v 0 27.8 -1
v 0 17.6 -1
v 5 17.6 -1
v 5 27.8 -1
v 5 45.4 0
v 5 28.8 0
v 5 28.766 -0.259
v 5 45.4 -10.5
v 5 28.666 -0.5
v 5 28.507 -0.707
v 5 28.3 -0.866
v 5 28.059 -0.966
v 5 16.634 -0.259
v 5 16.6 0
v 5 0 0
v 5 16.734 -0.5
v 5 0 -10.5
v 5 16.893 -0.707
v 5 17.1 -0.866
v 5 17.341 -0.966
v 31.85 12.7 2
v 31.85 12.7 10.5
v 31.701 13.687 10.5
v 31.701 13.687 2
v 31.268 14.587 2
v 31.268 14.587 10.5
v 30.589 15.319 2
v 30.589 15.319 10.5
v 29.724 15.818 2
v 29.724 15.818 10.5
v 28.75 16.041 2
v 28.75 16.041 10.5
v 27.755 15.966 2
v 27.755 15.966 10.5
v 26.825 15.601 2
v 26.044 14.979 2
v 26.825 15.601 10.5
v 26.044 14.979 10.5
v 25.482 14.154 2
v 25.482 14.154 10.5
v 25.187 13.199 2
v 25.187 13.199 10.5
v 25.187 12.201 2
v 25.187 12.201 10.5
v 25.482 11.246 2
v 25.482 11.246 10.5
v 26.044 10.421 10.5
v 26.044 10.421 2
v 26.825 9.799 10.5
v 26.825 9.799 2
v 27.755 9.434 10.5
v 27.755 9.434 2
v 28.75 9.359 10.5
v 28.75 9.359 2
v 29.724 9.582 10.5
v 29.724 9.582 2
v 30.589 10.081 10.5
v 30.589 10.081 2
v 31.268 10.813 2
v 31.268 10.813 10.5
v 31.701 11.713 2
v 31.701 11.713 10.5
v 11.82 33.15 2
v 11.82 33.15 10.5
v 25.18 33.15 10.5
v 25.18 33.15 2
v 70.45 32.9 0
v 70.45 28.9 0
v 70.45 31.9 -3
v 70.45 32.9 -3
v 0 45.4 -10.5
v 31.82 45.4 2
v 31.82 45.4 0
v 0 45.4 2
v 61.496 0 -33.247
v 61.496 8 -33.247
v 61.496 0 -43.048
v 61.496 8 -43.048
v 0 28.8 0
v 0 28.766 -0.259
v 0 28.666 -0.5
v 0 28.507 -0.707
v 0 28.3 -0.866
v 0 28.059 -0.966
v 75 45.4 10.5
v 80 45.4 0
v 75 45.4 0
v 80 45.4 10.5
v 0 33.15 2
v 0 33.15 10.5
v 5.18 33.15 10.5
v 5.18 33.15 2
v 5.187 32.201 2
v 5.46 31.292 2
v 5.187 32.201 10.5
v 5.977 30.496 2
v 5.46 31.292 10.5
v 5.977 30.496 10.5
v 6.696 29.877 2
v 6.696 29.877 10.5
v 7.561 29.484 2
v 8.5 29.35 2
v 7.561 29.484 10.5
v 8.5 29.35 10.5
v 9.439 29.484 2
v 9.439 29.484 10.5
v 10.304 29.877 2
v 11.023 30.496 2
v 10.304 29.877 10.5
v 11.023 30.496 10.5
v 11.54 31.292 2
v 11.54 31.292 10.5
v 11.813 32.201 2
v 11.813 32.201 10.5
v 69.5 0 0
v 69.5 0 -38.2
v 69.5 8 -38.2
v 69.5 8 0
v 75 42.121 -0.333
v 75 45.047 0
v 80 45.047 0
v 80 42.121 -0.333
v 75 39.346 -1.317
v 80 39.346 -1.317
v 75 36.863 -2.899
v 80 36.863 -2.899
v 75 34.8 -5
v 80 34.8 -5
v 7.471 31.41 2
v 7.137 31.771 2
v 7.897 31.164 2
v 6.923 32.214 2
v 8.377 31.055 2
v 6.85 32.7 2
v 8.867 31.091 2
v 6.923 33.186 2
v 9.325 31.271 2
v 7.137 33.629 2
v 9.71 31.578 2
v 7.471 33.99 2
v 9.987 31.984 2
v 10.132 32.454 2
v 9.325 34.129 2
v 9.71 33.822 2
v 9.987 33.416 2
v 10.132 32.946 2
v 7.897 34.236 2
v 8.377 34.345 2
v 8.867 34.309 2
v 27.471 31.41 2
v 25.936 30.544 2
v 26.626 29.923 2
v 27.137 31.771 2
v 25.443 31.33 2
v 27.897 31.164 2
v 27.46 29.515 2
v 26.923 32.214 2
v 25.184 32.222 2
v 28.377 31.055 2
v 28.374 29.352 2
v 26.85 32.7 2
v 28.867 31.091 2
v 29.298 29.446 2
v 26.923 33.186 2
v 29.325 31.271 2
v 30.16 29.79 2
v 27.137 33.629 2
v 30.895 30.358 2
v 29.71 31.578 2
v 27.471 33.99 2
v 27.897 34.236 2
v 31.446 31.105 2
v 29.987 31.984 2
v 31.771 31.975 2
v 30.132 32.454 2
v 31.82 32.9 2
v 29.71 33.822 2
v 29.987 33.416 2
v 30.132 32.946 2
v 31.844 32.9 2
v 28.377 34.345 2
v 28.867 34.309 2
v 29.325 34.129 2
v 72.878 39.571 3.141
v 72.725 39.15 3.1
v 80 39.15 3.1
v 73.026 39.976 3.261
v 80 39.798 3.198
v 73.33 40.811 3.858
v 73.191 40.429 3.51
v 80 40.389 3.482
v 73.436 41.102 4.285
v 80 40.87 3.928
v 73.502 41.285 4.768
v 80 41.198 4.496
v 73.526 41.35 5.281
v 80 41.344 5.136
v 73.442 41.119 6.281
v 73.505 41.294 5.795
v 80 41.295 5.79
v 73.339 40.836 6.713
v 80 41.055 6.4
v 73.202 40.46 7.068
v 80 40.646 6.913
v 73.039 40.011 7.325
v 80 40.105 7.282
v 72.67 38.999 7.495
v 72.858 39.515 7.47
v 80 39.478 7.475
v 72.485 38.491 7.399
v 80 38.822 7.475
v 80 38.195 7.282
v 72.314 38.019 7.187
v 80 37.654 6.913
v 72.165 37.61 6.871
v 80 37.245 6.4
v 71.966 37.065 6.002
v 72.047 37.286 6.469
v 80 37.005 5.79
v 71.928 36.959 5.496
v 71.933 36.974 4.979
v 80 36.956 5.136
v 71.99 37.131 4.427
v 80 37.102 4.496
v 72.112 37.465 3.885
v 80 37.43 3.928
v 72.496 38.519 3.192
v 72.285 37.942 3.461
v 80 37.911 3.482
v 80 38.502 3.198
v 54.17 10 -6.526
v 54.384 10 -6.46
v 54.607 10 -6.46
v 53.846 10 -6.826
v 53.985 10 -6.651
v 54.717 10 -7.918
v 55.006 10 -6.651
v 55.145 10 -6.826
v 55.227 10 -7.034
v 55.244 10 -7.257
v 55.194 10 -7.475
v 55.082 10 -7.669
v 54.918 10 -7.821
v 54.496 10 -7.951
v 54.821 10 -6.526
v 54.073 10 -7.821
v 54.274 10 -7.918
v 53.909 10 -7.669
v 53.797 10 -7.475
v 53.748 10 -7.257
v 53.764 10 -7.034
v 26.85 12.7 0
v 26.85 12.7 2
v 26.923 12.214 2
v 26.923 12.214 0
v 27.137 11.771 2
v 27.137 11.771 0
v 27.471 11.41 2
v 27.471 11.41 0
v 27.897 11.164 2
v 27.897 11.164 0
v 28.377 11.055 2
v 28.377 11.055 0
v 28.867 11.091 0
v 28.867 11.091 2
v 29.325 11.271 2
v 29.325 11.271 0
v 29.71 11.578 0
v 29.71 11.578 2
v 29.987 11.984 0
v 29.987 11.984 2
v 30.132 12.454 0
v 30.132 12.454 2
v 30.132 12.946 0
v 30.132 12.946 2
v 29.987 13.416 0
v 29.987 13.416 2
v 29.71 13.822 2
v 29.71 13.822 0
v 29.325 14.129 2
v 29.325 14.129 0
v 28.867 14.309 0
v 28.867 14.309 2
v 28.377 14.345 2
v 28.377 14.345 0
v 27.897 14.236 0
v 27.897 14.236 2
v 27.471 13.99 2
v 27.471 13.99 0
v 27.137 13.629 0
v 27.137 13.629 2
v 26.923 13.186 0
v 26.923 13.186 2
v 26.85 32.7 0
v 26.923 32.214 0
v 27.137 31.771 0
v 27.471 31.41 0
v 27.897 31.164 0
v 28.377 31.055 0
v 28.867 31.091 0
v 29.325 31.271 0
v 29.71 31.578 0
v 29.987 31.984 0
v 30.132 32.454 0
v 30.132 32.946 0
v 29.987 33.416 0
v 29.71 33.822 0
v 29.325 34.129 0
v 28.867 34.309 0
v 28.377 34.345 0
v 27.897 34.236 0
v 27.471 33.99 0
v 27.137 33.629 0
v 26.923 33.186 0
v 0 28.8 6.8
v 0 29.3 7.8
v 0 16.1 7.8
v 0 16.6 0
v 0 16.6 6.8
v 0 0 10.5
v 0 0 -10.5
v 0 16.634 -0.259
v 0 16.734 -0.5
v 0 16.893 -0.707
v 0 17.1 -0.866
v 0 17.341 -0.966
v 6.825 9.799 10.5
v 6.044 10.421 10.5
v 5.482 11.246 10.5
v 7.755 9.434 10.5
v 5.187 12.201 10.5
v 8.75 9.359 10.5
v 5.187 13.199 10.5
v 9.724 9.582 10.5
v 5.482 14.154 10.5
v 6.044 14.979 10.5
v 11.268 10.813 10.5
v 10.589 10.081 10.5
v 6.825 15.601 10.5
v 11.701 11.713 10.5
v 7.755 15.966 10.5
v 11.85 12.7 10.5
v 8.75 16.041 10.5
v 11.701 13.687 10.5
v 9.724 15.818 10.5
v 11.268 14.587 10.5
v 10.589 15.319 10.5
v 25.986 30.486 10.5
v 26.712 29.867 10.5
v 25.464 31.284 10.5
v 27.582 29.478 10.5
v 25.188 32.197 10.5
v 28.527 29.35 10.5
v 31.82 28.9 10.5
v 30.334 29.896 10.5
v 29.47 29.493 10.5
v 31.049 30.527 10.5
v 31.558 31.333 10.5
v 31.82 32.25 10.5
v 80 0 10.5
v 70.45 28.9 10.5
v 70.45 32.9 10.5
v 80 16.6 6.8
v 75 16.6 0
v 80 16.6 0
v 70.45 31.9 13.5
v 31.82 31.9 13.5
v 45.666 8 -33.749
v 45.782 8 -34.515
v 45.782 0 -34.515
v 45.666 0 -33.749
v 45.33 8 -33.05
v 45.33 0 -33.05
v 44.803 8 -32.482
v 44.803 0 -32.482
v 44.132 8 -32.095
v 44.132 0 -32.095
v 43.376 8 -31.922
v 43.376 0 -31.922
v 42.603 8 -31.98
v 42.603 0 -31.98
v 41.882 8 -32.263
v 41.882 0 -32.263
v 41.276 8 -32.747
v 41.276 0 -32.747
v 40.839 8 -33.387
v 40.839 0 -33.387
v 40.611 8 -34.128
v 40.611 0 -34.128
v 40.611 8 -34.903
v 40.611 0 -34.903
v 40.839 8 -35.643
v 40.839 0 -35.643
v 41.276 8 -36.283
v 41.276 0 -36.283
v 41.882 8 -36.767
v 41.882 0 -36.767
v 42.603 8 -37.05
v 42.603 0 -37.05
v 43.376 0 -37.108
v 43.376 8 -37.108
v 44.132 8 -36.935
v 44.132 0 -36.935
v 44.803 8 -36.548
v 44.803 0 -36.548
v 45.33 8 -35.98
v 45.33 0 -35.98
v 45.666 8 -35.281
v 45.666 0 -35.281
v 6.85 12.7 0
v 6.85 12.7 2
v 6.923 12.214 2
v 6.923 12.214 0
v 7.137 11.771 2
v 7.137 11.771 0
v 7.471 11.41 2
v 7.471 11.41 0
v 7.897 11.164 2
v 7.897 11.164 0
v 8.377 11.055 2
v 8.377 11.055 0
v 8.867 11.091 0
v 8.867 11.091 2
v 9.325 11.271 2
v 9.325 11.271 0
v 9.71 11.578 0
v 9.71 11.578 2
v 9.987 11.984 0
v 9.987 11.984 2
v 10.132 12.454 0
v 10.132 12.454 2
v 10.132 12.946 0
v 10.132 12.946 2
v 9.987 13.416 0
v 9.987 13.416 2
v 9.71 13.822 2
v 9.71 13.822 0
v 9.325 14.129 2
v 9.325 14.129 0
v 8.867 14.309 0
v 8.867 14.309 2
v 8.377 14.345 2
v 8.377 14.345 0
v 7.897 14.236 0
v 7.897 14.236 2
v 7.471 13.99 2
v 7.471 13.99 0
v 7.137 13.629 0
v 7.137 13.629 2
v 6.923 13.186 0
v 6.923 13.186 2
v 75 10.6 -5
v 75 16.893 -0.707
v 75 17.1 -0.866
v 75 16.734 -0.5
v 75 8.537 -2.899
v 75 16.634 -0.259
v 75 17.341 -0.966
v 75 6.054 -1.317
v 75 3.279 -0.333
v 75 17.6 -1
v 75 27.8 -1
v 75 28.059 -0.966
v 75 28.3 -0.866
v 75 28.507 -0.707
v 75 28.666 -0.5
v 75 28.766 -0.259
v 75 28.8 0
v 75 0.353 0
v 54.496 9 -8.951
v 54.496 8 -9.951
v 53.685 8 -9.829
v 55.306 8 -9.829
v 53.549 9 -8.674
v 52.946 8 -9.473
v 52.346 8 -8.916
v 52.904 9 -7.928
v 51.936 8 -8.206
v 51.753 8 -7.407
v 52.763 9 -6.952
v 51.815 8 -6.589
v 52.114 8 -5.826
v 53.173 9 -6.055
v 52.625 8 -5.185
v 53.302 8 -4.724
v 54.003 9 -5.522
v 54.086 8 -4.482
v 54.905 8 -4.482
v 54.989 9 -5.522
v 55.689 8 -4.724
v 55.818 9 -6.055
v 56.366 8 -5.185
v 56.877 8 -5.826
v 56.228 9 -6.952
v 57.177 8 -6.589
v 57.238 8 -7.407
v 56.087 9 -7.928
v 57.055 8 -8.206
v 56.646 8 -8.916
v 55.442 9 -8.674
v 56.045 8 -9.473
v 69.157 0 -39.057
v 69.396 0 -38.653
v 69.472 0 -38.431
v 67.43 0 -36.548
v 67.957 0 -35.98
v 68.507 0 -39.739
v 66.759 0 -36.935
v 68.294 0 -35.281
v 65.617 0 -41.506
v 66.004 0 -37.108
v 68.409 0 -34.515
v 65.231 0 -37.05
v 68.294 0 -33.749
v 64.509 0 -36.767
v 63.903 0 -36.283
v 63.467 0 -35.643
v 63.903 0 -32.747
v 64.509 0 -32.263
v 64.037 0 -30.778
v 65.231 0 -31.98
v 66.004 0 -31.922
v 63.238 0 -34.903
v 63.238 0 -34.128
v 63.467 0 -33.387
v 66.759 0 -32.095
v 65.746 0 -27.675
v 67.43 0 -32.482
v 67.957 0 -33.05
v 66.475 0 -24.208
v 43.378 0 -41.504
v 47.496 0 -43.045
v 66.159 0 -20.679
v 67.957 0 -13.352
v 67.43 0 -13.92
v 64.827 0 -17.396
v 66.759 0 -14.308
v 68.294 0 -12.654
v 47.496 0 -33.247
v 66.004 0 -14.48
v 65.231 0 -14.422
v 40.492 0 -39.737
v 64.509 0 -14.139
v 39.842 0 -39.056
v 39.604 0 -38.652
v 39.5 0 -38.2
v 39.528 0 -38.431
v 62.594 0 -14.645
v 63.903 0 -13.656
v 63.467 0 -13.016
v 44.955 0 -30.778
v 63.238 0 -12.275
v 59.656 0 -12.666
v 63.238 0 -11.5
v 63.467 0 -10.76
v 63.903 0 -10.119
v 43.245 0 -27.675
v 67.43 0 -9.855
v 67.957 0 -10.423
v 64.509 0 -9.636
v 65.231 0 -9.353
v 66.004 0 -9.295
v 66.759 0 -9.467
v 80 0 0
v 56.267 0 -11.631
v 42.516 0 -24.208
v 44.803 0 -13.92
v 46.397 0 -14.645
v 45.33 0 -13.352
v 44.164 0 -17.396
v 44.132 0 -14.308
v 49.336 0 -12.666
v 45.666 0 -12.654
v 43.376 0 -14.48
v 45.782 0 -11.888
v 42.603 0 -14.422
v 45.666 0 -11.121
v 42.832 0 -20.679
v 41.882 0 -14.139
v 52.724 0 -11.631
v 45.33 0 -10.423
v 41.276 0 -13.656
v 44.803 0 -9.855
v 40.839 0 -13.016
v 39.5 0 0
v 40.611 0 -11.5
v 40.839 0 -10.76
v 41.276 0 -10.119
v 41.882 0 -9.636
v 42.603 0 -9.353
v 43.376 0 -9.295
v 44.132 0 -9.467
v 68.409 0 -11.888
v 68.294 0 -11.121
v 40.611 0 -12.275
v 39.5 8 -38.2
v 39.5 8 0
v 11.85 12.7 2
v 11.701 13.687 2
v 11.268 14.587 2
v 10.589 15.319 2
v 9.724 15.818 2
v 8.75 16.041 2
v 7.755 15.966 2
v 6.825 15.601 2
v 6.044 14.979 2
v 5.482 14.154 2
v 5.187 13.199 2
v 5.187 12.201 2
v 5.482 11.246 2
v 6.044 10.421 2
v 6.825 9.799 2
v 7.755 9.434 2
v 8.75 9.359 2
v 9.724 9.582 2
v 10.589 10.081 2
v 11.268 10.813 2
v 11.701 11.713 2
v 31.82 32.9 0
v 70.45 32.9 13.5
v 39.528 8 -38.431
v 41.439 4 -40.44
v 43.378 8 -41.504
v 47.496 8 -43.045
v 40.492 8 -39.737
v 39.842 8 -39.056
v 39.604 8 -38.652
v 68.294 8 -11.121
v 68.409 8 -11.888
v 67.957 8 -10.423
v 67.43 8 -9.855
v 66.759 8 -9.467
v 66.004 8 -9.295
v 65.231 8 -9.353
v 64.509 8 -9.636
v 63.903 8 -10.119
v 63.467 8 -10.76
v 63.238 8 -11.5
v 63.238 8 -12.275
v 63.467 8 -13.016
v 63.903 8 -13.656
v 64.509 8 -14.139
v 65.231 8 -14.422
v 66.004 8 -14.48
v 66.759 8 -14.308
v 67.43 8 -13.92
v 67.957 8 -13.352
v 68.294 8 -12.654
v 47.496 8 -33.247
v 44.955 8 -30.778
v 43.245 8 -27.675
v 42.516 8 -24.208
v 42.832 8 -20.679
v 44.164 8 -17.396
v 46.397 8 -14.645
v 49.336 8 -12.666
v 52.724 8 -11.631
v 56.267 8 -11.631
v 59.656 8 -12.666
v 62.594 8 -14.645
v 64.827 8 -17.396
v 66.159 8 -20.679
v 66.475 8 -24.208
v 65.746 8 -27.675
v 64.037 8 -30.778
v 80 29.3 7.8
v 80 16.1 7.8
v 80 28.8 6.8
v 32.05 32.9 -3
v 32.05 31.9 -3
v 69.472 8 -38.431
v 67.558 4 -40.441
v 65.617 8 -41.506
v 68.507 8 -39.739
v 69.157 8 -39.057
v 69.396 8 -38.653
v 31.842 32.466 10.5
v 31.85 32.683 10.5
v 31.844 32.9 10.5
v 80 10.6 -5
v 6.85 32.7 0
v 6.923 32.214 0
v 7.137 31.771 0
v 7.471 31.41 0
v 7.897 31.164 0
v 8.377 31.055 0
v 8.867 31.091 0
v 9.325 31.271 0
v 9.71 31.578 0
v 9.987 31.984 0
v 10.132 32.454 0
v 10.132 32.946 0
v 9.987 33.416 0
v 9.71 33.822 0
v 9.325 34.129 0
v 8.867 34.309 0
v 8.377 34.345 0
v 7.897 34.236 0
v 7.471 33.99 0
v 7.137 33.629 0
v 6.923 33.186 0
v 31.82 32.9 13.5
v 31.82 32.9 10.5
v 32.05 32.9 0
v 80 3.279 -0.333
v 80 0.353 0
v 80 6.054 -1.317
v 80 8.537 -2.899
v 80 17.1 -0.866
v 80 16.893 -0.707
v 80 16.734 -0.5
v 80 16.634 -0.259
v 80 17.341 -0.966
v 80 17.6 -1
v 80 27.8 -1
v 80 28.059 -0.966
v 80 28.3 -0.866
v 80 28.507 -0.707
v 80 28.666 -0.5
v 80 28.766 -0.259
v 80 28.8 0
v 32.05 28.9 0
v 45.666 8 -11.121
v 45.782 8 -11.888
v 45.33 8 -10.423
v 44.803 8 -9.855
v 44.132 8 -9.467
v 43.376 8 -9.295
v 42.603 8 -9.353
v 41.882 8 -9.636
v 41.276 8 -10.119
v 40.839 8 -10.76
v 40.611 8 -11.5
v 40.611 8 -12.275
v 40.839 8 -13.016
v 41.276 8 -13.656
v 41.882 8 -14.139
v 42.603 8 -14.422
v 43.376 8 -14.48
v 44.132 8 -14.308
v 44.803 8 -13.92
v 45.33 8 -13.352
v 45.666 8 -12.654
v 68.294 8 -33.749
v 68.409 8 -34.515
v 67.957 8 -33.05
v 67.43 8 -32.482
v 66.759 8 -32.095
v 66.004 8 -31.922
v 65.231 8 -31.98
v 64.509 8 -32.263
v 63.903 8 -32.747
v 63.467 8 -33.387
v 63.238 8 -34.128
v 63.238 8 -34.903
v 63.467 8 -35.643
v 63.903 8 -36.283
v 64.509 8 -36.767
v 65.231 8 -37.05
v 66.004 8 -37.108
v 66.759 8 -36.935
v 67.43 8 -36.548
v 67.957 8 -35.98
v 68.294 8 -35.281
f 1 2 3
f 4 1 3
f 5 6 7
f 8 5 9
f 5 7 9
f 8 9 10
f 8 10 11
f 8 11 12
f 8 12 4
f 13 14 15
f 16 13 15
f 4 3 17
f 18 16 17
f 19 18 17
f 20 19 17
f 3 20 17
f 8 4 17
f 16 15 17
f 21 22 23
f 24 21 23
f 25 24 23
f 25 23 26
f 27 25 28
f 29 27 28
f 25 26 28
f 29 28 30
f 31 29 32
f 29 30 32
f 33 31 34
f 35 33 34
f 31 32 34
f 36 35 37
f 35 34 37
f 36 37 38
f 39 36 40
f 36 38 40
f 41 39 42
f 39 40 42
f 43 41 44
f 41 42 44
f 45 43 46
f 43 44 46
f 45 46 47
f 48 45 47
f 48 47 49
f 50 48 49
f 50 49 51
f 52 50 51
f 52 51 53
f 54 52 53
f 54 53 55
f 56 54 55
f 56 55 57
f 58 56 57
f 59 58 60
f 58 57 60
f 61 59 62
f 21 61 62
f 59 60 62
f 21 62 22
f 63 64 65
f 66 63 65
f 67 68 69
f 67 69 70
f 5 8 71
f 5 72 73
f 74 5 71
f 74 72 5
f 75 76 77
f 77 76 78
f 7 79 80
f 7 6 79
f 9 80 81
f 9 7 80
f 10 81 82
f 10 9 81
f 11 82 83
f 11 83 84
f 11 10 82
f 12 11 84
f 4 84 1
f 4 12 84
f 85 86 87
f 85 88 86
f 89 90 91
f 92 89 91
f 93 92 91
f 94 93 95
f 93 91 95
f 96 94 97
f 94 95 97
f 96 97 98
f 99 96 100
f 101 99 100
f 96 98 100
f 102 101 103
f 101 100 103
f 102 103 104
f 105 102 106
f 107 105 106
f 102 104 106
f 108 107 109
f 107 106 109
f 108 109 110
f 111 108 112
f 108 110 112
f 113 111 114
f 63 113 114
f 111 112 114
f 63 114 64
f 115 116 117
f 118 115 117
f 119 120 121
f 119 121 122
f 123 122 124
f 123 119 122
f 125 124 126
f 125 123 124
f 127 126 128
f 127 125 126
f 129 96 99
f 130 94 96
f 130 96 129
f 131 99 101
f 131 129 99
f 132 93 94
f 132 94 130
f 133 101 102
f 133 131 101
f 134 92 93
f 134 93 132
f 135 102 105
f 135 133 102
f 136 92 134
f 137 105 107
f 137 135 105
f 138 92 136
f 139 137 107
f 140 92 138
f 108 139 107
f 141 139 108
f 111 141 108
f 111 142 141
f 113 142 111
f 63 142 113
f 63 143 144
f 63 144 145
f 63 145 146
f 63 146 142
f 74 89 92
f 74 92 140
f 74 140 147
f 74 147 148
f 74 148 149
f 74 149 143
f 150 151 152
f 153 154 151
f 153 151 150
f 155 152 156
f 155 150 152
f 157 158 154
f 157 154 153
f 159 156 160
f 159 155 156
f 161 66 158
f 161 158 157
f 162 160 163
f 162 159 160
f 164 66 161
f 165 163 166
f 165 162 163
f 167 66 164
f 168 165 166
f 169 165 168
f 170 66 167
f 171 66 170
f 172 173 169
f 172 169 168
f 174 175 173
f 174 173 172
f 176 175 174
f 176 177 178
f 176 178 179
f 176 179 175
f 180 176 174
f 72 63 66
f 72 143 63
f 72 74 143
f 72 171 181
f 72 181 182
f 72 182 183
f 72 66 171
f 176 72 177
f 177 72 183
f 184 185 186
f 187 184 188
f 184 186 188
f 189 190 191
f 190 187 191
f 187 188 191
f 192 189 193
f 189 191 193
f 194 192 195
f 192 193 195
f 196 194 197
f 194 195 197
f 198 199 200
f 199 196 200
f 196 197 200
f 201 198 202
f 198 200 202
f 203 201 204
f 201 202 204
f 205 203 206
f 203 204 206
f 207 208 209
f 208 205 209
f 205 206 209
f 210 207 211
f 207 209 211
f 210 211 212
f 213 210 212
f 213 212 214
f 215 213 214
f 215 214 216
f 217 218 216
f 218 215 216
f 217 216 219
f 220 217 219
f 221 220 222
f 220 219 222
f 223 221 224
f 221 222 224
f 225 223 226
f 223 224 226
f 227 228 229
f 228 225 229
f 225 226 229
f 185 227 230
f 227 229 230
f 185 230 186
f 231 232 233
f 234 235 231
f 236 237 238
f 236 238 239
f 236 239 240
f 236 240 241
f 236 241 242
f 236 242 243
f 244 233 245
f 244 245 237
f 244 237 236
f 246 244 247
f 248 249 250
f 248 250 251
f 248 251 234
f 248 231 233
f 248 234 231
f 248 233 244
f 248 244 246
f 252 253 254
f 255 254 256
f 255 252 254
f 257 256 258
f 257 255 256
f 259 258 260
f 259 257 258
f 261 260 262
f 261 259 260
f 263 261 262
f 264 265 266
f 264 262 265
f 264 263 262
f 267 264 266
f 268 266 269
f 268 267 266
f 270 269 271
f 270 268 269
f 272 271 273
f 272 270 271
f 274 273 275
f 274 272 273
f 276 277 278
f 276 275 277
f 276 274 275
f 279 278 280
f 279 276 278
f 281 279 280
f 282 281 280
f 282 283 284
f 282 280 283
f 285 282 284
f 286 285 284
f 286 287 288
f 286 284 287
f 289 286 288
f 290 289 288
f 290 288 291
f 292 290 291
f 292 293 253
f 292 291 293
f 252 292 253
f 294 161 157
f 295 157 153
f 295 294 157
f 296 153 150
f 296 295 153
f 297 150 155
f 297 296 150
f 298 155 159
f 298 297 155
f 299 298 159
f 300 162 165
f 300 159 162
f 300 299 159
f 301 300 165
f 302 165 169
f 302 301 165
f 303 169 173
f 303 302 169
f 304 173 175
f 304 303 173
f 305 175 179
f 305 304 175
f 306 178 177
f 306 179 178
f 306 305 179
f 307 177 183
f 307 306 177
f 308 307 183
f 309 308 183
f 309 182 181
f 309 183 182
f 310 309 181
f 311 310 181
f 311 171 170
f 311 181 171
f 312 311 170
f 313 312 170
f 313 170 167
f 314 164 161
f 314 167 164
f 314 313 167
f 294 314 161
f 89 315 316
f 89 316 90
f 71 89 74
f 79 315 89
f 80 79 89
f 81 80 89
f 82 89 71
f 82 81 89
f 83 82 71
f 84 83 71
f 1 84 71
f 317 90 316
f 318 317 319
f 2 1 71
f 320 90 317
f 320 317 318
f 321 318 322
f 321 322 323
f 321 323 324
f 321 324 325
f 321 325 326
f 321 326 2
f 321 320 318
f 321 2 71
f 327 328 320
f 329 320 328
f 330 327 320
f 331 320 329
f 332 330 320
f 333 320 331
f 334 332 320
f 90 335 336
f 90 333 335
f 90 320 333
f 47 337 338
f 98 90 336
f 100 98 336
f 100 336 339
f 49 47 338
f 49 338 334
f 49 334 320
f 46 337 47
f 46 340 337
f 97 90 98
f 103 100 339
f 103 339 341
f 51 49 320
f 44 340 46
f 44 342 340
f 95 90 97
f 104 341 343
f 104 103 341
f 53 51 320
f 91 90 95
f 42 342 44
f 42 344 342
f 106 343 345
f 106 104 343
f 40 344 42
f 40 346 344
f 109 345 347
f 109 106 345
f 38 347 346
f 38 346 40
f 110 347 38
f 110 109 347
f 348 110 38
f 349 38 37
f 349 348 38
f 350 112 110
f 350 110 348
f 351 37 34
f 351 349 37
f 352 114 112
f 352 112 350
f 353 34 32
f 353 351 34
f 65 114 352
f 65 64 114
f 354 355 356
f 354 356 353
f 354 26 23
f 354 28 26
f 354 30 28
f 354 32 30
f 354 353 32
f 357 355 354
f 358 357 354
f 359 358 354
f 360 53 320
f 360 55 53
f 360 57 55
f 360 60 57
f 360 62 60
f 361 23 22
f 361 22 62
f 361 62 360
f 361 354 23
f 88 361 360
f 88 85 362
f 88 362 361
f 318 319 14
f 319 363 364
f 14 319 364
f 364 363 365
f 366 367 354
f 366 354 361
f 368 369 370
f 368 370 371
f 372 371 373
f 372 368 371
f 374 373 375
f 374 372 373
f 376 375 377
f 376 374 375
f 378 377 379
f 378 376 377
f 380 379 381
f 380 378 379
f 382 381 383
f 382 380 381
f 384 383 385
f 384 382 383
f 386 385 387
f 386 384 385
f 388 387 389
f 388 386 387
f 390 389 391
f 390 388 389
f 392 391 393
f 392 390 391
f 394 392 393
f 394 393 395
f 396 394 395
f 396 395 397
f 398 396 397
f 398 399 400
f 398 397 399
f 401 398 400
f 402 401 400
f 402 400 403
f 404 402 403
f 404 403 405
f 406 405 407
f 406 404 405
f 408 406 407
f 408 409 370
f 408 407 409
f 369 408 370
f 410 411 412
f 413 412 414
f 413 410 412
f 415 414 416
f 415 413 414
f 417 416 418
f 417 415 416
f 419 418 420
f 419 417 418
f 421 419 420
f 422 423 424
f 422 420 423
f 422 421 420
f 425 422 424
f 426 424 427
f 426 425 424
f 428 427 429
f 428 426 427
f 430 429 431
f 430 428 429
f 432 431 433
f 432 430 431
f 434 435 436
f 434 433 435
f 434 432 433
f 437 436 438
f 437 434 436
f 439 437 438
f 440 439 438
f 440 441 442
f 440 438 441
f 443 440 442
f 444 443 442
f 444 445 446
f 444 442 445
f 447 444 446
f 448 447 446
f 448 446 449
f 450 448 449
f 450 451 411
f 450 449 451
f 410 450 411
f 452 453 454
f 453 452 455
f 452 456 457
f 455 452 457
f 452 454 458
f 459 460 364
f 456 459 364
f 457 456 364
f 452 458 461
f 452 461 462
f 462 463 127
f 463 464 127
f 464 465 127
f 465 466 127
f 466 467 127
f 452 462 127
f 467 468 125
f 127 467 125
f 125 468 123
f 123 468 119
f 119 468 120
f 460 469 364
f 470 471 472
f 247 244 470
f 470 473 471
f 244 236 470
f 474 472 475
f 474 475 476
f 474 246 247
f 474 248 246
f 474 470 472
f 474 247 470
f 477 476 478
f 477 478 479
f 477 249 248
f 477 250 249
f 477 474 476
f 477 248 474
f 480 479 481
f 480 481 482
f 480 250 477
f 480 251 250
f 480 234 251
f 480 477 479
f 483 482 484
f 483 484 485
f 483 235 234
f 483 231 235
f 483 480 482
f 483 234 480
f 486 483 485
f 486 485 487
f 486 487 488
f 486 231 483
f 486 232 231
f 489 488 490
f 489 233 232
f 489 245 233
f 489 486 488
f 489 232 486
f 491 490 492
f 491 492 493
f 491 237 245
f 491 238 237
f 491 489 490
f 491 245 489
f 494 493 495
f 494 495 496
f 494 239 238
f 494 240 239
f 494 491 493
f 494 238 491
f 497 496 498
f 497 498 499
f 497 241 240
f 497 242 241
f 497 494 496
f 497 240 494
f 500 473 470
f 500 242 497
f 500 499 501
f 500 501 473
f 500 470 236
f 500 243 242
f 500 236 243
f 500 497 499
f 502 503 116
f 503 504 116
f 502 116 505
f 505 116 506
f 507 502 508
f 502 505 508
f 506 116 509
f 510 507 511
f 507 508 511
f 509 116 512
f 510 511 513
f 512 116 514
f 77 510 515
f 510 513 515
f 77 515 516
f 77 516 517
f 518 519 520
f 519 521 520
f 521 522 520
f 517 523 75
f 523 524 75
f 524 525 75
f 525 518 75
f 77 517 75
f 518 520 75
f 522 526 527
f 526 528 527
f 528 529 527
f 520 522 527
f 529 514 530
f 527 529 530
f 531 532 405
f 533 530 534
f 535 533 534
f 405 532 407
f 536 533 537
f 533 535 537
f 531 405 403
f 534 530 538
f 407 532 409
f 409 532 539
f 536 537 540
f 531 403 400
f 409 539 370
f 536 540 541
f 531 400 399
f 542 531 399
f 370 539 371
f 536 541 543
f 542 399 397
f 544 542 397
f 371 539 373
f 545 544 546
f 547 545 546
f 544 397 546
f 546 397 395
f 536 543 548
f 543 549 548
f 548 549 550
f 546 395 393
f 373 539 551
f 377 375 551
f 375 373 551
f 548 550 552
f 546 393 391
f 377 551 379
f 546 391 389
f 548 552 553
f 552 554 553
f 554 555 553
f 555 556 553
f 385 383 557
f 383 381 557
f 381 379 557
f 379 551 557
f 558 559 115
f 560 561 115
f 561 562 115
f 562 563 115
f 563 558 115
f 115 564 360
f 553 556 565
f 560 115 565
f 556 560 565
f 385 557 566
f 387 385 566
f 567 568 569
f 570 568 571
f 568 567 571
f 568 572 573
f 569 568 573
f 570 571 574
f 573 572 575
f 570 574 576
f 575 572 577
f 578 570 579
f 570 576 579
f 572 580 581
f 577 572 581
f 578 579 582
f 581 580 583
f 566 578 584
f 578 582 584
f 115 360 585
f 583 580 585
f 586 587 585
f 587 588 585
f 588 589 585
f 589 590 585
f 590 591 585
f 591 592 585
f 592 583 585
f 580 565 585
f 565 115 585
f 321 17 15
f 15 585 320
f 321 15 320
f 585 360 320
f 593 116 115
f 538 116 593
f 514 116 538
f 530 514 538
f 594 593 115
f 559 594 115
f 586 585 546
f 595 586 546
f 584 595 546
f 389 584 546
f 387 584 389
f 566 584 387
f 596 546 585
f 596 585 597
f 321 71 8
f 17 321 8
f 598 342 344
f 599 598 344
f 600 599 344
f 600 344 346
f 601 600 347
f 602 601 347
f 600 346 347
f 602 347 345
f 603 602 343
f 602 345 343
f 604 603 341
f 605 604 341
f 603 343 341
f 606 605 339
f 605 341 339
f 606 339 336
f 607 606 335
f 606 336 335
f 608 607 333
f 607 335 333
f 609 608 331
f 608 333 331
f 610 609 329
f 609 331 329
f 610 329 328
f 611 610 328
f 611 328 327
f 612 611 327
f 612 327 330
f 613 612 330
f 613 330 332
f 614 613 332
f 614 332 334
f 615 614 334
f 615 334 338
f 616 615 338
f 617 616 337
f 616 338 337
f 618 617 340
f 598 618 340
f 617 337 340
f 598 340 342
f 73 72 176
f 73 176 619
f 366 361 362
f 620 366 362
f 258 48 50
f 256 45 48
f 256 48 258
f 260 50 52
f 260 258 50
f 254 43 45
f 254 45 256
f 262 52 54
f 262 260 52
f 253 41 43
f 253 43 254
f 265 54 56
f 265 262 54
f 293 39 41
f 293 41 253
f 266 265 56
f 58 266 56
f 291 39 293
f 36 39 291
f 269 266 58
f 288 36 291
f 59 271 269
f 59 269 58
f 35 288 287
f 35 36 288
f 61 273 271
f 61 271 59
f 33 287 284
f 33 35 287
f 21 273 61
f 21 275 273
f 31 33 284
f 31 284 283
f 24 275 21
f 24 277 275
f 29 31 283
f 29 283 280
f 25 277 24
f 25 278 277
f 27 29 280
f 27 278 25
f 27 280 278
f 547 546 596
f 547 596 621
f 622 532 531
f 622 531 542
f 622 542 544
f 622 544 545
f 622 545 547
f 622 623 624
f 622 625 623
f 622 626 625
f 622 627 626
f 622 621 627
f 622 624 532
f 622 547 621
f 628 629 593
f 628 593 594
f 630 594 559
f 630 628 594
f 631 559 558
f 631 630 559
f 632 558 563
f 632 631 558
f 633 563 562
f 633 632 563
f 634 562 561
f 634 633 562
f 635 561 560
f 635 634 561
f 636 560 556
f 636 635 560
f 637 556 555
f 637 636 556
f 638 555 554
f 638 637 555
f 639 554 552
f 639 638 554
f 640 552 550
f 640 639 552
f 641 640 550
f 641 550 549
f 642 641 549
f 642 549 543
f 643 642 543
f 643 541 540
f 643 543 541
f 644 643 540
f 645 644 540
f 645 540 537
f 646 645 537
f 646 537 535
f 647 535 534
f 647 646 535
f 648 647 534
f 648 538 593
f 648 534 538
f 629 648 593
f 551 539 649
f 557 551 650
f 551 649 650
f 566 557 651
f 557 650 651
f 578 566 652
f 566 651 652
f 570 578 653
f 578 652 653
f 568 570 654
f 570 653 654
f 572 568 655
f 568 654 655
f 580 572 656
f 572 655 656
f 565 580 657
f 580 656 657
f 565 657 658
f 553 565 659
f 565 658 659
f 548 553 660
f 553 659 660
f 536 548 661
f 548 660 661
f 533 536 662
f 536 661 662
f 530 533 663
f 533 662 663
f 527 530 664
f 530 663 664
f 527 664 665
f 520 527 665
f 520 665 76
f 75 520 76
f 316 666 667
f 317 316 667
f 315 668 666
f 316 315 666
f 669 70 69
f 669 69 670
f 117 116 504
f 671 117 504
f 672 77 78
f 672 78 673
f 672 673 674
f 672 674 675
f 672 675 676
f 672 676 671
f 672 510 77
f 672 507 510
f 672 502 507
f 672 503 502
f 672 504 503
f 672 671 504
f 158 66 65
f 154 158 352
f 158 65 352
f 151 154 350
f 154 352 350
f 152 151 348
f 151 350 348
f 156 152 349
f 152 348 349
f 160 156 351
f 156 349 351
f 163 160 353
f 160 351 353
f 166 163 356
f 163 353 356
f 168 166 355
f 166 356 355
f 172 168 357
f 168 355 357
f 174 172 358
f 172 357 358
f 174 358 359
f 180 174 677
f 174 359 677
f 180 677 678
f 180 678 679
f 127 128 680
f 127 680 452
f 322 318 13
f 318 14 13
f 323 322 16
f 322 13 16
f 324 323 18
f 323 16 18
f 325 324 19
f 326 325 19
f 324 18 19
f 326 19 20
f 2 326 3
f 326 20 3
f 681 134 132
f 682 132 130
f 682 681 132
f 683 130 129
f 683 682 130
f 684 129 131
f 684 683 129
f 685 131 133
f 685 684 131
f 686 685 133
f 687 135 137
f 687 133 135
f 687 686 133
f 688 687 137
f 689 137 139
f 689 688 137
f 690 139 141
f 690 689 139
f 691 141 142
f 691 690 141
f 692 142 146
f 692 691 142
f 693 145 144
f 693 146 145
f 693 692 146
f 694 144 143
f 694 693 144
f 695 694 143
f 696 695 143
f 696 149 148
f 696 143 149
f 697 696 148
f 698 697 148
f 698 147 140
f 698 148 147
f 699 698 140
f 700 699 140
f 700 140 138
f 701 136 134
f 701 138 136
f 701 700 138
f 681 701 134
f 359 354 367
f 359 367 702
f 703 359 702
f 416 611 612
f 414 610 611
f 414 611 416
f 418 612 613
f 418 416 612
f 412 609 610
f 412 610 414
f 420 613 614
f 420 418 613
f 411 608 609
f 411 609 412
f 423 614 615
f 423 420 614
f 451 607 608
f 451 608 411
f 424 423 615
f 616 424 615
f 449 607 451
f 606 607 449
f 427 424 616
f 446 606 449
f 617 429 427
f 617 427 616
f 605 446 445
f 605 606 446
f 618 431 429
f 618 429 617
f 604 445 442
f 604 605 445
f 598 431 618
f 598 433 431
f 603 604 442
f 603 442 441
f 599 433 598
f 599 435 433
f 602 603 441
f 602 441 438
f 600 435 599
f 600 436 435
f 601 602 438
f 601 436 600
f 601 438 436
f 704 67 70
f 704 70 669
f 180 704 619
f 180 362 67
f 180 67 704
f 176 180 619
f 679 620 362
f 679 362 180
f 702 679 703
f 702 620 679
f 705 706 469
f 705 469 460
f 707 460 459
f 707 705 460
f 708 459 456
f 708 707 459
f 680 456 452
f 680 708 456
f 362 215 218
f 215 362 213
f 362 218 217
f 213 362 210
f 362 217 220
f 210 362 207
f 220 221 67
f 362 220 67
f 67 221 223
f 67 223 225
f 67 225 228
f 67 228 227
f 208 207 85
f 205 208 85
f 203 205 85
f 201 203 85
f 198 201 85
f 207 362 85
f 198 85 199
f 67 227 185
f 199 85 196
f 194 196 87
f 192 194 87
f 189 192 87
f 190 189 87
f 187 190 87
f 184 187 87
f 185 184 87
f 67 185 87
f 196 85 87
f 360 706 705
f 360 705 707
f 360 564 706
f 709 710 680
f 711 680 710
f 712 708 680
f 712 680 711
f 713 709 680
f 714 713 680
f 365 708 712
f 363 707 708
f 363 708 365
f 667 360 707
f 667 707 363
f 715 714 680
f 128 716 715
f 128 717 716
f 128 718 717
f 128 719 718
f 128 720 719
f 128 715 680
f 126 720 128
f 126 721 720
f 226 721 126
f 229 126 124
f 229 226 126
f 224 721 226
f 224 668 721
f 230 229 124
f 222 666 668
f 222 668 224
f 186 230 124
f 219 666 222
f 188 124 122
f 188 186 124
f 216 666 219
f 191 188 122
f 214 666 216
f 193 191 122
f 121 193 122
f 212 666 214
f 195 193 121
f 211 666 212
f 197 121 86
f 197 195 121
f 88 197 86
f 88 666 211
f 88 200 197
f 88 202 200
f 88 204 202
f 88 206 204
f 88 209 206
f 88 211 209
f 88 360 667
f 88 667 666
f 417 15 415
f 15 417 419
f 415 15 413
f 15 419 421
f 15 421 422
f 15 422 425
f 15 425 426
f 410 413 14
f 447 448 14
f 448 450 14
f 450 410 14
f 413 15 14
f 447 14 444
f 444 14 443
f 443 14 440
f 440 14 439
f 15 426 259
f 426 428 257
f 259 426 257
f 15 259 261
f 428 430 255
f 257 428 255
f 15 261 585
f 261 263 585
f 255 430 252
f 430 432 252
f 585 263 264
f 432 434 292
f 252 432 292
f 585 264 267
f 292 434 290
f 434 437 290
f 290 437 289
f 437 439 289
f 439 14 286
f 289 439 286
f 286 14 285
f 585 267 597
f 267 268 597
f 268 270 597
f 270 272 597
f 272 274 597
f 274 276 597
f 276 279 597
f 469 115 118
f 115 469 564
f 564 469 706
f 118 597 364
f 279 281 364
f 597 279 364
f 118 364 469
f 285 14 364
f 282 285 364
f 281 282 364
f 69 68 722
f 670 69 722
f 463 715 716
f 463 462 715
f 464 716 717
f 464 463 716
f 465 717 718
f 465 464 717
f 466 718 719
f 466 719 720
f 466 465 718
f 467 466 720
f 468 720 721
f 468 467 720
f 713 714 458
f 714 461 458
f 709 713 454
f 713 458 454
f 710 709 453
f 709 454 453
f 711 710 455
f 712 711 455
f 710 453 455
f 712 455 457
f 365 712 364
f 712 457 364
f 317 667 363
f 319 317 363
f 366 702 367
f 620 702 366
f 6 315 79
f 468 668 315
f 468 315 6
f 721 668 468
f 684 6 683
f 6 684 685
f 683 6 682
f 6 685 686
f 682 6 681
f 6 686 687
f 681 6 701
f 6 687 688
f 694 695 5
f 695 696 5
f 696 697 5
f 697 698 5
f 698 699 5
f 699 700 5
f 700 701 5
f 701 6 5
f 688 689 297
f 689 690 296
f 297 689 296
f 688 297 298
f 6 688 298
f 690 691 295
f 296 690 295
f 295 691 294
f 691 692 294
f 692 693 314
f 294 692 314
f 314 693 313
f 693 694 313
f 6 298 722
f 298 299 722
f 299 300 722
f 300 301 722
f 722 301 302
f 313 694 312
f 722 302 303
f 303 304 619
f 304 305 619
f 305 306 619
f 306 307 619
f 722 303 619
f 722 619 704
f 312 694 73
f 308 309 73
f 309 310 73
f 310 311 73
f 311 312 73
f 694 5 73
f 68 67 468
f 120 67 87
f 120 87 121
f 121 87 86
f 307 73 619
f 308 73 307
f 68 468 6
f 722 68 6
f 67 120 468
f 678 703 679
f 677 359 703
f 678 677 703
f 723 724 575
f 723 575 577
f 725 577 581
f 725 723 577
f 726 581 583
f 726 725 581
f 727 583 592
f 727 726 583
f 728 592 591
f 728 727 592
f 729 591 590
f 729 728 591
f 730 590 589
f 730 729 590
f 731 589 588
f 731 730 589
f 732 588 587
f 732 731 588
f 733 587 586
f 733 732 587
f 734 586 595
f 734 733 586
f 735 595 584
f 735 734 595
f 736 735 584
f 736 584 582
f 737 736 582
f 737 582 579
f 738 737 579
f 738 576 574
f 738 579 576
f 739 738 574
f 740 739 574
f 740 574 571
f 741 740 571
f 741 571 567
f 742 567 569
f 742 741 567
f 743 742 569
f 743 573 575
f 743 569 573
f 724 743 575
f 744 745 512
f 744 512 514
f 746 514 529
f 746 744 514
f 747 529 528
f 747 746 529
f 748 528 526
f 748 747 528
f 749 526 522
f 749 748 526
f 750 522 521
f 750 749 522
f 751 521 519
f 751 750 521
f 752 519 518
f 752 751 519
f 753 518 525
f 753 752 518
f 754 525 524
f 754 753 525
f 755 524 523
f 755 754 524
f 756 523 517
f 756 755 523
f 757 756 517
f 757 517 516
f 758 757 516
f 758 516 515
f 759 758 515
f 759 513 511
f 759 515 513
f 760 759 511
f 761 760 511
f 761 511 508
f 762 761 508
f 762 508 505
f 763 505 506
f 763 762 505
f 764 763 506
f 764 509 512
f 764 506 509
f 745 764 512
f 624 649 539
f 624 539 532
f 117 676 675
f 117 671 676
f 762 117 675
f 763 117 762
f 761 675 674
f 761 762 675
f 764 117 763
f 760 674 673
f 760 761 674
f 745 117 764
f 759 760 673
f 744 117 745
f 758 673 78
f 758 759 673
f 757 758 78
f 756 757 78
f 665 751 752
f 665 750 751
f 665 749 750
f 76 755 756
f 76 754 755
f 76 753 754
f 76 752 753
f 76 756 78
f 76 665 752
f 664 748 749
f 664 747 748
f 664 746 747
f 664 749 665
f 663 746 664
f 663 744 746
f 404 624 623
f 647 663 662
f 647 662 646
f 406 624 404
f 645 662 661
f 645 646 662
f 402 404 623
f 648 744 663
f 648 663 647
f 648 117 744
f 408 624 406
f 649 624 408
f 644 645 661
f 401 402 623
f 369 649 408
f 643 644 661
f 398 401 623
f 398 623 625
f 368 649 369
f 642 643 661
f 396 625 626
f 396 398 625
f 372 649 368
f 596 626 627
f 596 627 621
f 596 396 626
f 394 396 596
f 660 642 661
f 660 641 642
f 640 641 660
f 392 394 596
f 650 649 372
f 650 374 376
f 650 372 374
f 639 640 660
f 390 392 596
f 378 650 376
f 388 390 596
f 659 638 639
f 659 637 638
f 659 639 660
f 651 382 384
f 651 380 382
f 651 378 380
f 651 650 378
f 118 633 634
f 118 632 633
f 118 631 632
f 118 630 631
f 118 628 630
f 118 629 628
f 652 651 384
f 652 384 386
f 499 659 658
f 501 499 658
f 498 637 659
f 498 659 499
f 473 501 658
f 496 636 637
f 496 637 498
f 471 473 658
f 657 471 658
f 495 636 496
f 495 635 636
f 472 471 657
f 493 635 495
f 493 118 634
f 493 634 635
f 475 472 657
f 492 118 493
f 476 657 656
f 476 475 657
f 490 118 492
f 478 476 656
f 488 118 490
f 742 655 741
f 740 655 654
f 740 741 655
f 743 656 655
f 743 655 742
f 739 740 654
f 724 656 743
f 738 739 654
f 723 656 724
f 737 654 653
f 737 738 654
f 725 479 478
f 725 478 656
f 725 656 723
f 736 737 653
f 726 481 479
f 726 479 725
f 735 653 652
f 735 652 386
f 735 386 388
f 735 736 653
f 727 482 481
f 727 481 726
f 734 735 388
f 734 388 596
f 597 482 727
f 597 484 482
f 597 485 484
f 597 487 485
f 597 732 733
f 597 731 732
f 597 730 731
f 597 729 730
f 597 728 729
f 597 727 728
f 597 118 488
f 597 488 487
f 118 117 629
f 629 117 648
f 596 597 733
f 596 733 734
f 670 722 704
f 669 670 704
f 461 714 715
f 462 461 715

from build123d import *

# Parameters (mm, degrees)
SKETCH1_W               = 80
SKETCH1_H               = 45.4
SKETCH1_R               = 1.65
BOSS_EXTRUDE1_DEPTH     = 10.5
SKETCH2_W               = 5
SKETCH2_H               = 45.4
BOSS_EXTRUDE2_DEPTH     = 10.5
CUT_EXTRUDE1_DEPTH      = 7.8
CUT_EXTRUDE1_DEPTH_BACK = 93.58190968
SKETCH3_W               = 80
SKETCH3_H               = 12.2
SKETCH4_W               = 30
SKETCH4_H               = 8
BOSS_EXTRUDE3_DEPTH     = 44.2
SKETCH5_R               = 12
CUT_EXTRUDE2_DEPTH      = 45
CUT_EXTRUDE3_DEPTH      = 96.828388278
CUT_EXTRUDE3_DEPTH_BACK = 96.828388278
SKETCH6_R               = 2.6
FILLET1_SIZE            = 6
FILLET1_SIZE_2          = 15
SKETCH8_R               = 3.35
CUT_EXTRUDE5_DEPTH      = 8.5
SKETCH12_W              = 45
SKETCH12_H              = 12.25
CUT_EXTRUDE8_DEPTH      = 8.5
SKETCH13_W              = 14
SKETCH13_H              = 23.274164218
CUT_EXTRUDE10_DEPTH     = 10
SKETCH15_R              = 2.75
BOSS_EXTRUDE6_DEPTH     = 2
SKETCH16_W              = 43.180372268
SKETCH16_H              = 10.5
CUT_EXTRUDE11_DEPTH     = 12.5
CHAMFER2_SIZE2          = 12.5
CHAMFER2_SIZE           = 4.549627928
SKETCH17_R              = 2.2
CUT_EXTRUDE12_DEPTH     = 10
CUT_EXTRUDE13_DEPTH     = 102.559280367
SKETCH19_W              = 5
SKETCH19_H              = 24.2
BOSS_EXTRUDE7_DEPTH     = 5
SKETCH20_W              = 1
SKETCH20_H              = 12.2
CUT_EXTRUDE14_DEPTH     = 102.559280367
SKETCH21_W              = 5
SKETCH21_H              = 9.5
BOSS_EXTRUDE8_DEPTH     = 12.2
FILLET2_R               = 1
FILLET3_R               = 13
CHAMFER1_SIZE           = 2
SKETCH22_W              = 38.63074434
SKETCH22_H              = 1
BOSS_EXTRUDE9_DEPTH     = 3
SKETCH23_W              = 38.4
SKETCH23_H              = 1
BOSS_EXTRUDE10_DEPTH    = 3
CHAMFER3_SIZE           = 3


# Some blends are built 0.0001 mm under size
with BuildPart() as part:
    # Sketch1 → Boss-Extrude1 (new body)
    with BuildSketch(Plane.XY):
        with Locations((40, 22.7)):
            Rectangle(SKETCH1_W, SKETCH1_H)
        with Locations(Location((8.499989197, 32.7, 0), (0, 0, 180))):
            Circle(SKETCH1_R, mode=Mode.SUBTRACT)
        with Locations(Location((28.499989197, 32.7, 0), (0, 0, 180))):
            Circle(SKETCH1_R, mode=Mode.SUBTRACT)
        with Locations(Location((28.499989197, 12.7, 0), (0, 0, 180))):
            Circle(SKETCH1_R, mode=Mode.SUBTRACT)
        with Locations(Location((8.499989197, 12.7, 0), (0, 0, 180))):
            Circle(SKETCH1_R, mode=Mode.SUBTRACT)
    extrude(amount=BOSS_EXTRUDE1_DEPTH)

    # Sketch2 → Boss-Extrude2 (add)
    with BuildSketch(Plane(origin=(0, 0, 0), x_dir=(-1, 0, 0), z_dir=(0, 0, -1))):
        with Locations((-2.5, 22.7)):
            Rectangle(SKETCH2_W, SKETCH2_H)
    extrude(amount=BOSS_EXTRUDE2_DEPTH)

    # Sketch3 → Cut-Extrude1 (cut, two sides: drawn at the far end of the back side and taken through both)
    with BuildSketch(Plane.XY.offset(-CUT_EXTRUDE1_DEPTH_BACK)):
        with Locations((40, 22.7)):
            Rectangle(SKETCH3_W, SKETCH3_H)
    extrude(amount=CUT_EXTRUDE1_DEPTH + CUT_EXTRUDE1_DEPTH_BACK, mode=Mode.SUBTRACT)

    # Sketch4 → Boss-Extrude3 (add)
    with BuildSketch(Plane(origin=(0, 0, 0), x_dir=(-1, 0, 0), z_dir=(0, 0, -1))):
        with Locations((-54.5, 4)):
            Rectangle(SKETCH4_W, SKETCH4_H)
    extrude(amount=BOSS_EXTRUDE3_DEPTH)

    # Sketch5 → Cut-Extrude2 (cut)
    with BuildSketch(Plane(origin=(0, 8, 0), x_dir=(1, 0, 0), z_dir=(0, 1, 0))):
        with Locations(Location((54.495569327, 23.5, 0), (0, 0, 270))):
            Circle(SKETCH5_R)
    extrude(amount=-CUT_EXTRUDE2_DEPTH, mode=Mode.SUBTRACT)

    # Sketch6 → Cut-Extrude3 (cut, two sides: drawn at the far end of the back side and taken through both)
    with BuildSketch(Plane.XZ.offset(-16.6).offset(-CUT_EXTRUDE3_DEPTH_BACK)):
        with Locations((54.495569327, -39.201340103)):
            Circle(SKETCH6_R)
        with Locations((65.809277826, -34.515048602)):
            Circle(SKETCH6_R)
        with Locations((43.181860828, -34.515048602)):
            Circle(SKETCH6_R)
        with Locations((43.181860828, -11.887631605)):
            Circle(SKETCH6_R)
        with Locations((65.809277826, -11.887631605)):
            Circle(SKETCH6_R)
    extrude(amount=CUT_EXTRUDE3_DEPTH + CUT_EXTRUDE3_DEPTH_BACK, mode=Mode.SUBTRACT)

    # Fillet1
    # a fillet whose section is not a circle: 15, 6 mm, written as the material it takes off along each edge
    with BuildSketch(Plane(origin=(39.5, -37.5, -44.2), x_dir=(0, 0, 1), z_dir=(0, 1, 0)), Plane(origin=(69.5, 45.5, -44.2), x_dir=(0, 0, 1), z_dir=(0, -1, 0))) as fillet1_piece_1:
        with BuildLine():
            Bezier((FILLET1_SIZE, 0), (0, 0), (0, FILLET1_SIZE_2), weights=[1, 0.428571429, 1])
            Line((0, FILLET1_SIZE_2), (0, 0))
            Line((0, 0), (FILLET1_SIZE, 0))
        make_face()
    extrude(amount=83, mode=Mode.SUBTRACT)

    # Sketch8 → Cut-Extrude5 (cut)
    with BuildSketch(Plane.XY.offset(10.5)):
        with Locations((8.499989197, 32.7)):
            Circle(SKETCH8_R)
        with Locations((28.499989197, 32.7)):
            Circle(SKETCH8_R)
        with Locations((8.499989197, 12.7)):
            Circle(SKETCH8_R)
        with Locations((28.499989197, 12.7)):
            Circle(SKETCH8_R)
    extrude(amount=-CUT_EXTRUDE5_DEPTH, mode=Mode.SUBTRACT)

    # Sketch12 → Cut-Extrude8 (cut)
    with BuildSketch(Plane.XY.offset(10.5)):
        with Locations((22.5, 39.275)):
            Rectangle(SKETCH12_W, SKETCH12_H)
    extrude(amount=-CUT_EXTRUDE8_DEPTH, mode=Mode.SUBTRACT)

    # Sketch13 → Cut-Extrude10 (cut)
    with BuildSketch(Plane(origin=(0, 8, 0), x_dir=(1, 0, 0), z_dir=(0, 1, 0))):
        with Locations((54.495569327, 39.201340103)):
            Rectangle(SKETCH13_W, SKETCH13_H)
    extrude(amount=-CUT_EXTRUDE10_DEPTH, mode=Mode.SUBTRACT)

    # Sketch15 → Boss-Extrude6 (add)
    with BuildSketch(Plane(origin=(0, 8, 0), x_dir=(1, 0, 0), z_dir=(0, 1, 0))):
        with Locations(Location((54.495569327, 7.201340104, 0), (0, 0, 90))):
            Circle(SKETCH15_R)
    extrude(amount=BOSS_EXTRUDE6_DEPTH)

    # Sketch16 → Cut-Extrude11 (cut)
    with BuildSketch(Plane(origin=(0, 45.4, 0), x_dir=(1, 0, 0), z_dir=(0, 1, 0))):
        with Locations((53.409813866, -5.25)):
            Rectangle(SKETCH16_W, SKETCH16_H)
    extrude(amount=-CUT_EXTRUDE11_DEPTH, mode=Mode.SUBTRACT)

    # Chamfer2
    chamfer2_edges = [part.edges().sort_by_distance(p)[0] for p in [
        (75, 32.9, 5.25),
    ]]
    chamfer2_side = [part.faces().sort_by_distance(p)[0] for p in [
        (74.909007441, 32.9, 5.25),
    ]]
    chamfer(chamfer2_edges, length=CHAMFER2_SIZE - 0.0001, length2=CHAMFER2_SIZE2 - 0.0001, reference=chamfer2_side[0])  # a hair under: the kernel refuses the full size

    # Sketch17 → Cut-Extrude12 (cut)
    with BuildSketch(Plane(origin=(80, 0, 0), x_dir=(0, 0, -1), z_dir=(1, 0, 0))):
        with Locations((-5.3, 39.15)):
            Circle(SKETCH17_R)
    extrude(amount=-CUT_EXTRUDE12_DEPTH, mode=Mode.SUBTRACT)

    # Sketch18 → Cut-Extrude13 (cut, through all)
    with BuildSketch(Plane(origin=(80, 0, 0), x_dir=(0, 0, -1), z_dir=(1, 0, 0))):
        Polygon((-7.8, 28.8), (-6.8, 28.8), (-7.8, 29.3), align=None)
        Polygon((-7.8, 16.6), (-7.8, 16.1), (-6.8, 16.6), align=None)
    extrude(amount=-CUT_EXTRUDE13_DEPTH, mode=Mode.SUBTRACT)

    # Sketch19 → Boss-Extrude7 (add)
    with BuildSketch(Plane(origin=(0, 0, 0), x_dir=(-1, 0, 0), z_dir=(0, 0, -1))):
        with Locations((-77.5, 22.7)):
            Rectangle(SKETCH19_W, SKETCH19_H)
    extrude(amount=BOSS_EXTRUDE7_DEPTH)

    # Sketch20 → Cut-Extrude14 (cut, through all)
    with BuildSketch(Plane(origin=(80, 0, 0), x_dir=(0, 0, -1), z_dir=(1, 0, 0))):
        with Locations((0.5, 22.7)):
            Rectangle(SKETCH20_W, SKETCH20_H)
    extrude(amount=-CUT_EXTRUDE14_DEPTH, mode=Mode.SUBTRACT)

    # Sketch21 → Boss-Extrude8 (add)
    with BuildSketch(Plane(origin=(0, 16.6, 0), x_dir=(1, 0, 0), z_dir=(0, 1, 0))):
        with Locations((2.5, 5.75)):
            Rectangle(SKETCH21_W, SKETCH21_H)
    extrude(amount=BOSS_EXTRUDE8_DEPTH)

    # Fillet2
    fillet2_edges = [part.edges().sort_by_distance(p)[0] for p in [
        (77.5, 16.6, -1),
        (77.5, 28.8, -1),
        (2.5, 16.6, -1),
        (2.5, 28.8, -1),
    ]]
    fillet(fillet2_edges, radius=FILLET2_R)

    # Fillet3
    # the kernel refuses this fillet: 13 mm, written as the material it adds along each edge
    with BuildSketch(Plane(origin=(80, 10.6, 0), x_dir=(0, -1, 0), z_dir=(-1, 0, 0)), Plane(origin=(75, 34.8, 0), x_dir=(0, 1, 0), z_dir=(1, 0, 0))) as fillet3_piece_1:
        with BuildLine():
            CenterArc((10.246950766, -13), FILLET3_R, 90, 52.020127555)
            Line((0, -5), (0, 0))
            Line((0, 0), (10.246950766, 0))
        make_face()
    extrude(amount=5)

    # Chamfer1
    chamfer1_edges = [part.edges().sort_by_distance(p)[0] for p in [
        (54.495569327, 10, -4.451340104),
    ]]
    chamfer(chamfer1_edges, length=CHAMFER1_SIZE - 0.0001)  # a hair under: the kernel refuses the full size

    # Sketch22 → Boss-Extrude9 (add)
    with BuildSketch(Plane.XY.offset(10.5)):
        with Locations((51.134999902, 32.4)):
            Rectangle(SKETCH22_W, SKETCH22_H)
    extrude(amount=BOSS_EXTRUDE9_DEPTH)

    # Sketch23 → Boss-Extrude10 (add)
    with BuildSketch(Plane(origin=(0, 0, 0), x_dir=(-1, 0, 0), z_dir=(0, 0, -1))):
        with Locations((-51.250372072, 32.4)):
            Rectangle(SKETCH23_W, SKETCH23_H)
    extrude(amount=BOSS_EXTRUDE10_DEPTH)

    # Chamfer3
    chamfer3_edges = [part.edges().sort_by_distance(p)[0] for p in [
        (51.134999902, 31.9, 10.5),
        (51.250372072, 31.9, 0),
    ]]
    chamfer(chamfer3_edges, length=CHAMFER3_SIZE - 0.0001)  # a hair under: the kernel refuses the full size


solid = part.part
